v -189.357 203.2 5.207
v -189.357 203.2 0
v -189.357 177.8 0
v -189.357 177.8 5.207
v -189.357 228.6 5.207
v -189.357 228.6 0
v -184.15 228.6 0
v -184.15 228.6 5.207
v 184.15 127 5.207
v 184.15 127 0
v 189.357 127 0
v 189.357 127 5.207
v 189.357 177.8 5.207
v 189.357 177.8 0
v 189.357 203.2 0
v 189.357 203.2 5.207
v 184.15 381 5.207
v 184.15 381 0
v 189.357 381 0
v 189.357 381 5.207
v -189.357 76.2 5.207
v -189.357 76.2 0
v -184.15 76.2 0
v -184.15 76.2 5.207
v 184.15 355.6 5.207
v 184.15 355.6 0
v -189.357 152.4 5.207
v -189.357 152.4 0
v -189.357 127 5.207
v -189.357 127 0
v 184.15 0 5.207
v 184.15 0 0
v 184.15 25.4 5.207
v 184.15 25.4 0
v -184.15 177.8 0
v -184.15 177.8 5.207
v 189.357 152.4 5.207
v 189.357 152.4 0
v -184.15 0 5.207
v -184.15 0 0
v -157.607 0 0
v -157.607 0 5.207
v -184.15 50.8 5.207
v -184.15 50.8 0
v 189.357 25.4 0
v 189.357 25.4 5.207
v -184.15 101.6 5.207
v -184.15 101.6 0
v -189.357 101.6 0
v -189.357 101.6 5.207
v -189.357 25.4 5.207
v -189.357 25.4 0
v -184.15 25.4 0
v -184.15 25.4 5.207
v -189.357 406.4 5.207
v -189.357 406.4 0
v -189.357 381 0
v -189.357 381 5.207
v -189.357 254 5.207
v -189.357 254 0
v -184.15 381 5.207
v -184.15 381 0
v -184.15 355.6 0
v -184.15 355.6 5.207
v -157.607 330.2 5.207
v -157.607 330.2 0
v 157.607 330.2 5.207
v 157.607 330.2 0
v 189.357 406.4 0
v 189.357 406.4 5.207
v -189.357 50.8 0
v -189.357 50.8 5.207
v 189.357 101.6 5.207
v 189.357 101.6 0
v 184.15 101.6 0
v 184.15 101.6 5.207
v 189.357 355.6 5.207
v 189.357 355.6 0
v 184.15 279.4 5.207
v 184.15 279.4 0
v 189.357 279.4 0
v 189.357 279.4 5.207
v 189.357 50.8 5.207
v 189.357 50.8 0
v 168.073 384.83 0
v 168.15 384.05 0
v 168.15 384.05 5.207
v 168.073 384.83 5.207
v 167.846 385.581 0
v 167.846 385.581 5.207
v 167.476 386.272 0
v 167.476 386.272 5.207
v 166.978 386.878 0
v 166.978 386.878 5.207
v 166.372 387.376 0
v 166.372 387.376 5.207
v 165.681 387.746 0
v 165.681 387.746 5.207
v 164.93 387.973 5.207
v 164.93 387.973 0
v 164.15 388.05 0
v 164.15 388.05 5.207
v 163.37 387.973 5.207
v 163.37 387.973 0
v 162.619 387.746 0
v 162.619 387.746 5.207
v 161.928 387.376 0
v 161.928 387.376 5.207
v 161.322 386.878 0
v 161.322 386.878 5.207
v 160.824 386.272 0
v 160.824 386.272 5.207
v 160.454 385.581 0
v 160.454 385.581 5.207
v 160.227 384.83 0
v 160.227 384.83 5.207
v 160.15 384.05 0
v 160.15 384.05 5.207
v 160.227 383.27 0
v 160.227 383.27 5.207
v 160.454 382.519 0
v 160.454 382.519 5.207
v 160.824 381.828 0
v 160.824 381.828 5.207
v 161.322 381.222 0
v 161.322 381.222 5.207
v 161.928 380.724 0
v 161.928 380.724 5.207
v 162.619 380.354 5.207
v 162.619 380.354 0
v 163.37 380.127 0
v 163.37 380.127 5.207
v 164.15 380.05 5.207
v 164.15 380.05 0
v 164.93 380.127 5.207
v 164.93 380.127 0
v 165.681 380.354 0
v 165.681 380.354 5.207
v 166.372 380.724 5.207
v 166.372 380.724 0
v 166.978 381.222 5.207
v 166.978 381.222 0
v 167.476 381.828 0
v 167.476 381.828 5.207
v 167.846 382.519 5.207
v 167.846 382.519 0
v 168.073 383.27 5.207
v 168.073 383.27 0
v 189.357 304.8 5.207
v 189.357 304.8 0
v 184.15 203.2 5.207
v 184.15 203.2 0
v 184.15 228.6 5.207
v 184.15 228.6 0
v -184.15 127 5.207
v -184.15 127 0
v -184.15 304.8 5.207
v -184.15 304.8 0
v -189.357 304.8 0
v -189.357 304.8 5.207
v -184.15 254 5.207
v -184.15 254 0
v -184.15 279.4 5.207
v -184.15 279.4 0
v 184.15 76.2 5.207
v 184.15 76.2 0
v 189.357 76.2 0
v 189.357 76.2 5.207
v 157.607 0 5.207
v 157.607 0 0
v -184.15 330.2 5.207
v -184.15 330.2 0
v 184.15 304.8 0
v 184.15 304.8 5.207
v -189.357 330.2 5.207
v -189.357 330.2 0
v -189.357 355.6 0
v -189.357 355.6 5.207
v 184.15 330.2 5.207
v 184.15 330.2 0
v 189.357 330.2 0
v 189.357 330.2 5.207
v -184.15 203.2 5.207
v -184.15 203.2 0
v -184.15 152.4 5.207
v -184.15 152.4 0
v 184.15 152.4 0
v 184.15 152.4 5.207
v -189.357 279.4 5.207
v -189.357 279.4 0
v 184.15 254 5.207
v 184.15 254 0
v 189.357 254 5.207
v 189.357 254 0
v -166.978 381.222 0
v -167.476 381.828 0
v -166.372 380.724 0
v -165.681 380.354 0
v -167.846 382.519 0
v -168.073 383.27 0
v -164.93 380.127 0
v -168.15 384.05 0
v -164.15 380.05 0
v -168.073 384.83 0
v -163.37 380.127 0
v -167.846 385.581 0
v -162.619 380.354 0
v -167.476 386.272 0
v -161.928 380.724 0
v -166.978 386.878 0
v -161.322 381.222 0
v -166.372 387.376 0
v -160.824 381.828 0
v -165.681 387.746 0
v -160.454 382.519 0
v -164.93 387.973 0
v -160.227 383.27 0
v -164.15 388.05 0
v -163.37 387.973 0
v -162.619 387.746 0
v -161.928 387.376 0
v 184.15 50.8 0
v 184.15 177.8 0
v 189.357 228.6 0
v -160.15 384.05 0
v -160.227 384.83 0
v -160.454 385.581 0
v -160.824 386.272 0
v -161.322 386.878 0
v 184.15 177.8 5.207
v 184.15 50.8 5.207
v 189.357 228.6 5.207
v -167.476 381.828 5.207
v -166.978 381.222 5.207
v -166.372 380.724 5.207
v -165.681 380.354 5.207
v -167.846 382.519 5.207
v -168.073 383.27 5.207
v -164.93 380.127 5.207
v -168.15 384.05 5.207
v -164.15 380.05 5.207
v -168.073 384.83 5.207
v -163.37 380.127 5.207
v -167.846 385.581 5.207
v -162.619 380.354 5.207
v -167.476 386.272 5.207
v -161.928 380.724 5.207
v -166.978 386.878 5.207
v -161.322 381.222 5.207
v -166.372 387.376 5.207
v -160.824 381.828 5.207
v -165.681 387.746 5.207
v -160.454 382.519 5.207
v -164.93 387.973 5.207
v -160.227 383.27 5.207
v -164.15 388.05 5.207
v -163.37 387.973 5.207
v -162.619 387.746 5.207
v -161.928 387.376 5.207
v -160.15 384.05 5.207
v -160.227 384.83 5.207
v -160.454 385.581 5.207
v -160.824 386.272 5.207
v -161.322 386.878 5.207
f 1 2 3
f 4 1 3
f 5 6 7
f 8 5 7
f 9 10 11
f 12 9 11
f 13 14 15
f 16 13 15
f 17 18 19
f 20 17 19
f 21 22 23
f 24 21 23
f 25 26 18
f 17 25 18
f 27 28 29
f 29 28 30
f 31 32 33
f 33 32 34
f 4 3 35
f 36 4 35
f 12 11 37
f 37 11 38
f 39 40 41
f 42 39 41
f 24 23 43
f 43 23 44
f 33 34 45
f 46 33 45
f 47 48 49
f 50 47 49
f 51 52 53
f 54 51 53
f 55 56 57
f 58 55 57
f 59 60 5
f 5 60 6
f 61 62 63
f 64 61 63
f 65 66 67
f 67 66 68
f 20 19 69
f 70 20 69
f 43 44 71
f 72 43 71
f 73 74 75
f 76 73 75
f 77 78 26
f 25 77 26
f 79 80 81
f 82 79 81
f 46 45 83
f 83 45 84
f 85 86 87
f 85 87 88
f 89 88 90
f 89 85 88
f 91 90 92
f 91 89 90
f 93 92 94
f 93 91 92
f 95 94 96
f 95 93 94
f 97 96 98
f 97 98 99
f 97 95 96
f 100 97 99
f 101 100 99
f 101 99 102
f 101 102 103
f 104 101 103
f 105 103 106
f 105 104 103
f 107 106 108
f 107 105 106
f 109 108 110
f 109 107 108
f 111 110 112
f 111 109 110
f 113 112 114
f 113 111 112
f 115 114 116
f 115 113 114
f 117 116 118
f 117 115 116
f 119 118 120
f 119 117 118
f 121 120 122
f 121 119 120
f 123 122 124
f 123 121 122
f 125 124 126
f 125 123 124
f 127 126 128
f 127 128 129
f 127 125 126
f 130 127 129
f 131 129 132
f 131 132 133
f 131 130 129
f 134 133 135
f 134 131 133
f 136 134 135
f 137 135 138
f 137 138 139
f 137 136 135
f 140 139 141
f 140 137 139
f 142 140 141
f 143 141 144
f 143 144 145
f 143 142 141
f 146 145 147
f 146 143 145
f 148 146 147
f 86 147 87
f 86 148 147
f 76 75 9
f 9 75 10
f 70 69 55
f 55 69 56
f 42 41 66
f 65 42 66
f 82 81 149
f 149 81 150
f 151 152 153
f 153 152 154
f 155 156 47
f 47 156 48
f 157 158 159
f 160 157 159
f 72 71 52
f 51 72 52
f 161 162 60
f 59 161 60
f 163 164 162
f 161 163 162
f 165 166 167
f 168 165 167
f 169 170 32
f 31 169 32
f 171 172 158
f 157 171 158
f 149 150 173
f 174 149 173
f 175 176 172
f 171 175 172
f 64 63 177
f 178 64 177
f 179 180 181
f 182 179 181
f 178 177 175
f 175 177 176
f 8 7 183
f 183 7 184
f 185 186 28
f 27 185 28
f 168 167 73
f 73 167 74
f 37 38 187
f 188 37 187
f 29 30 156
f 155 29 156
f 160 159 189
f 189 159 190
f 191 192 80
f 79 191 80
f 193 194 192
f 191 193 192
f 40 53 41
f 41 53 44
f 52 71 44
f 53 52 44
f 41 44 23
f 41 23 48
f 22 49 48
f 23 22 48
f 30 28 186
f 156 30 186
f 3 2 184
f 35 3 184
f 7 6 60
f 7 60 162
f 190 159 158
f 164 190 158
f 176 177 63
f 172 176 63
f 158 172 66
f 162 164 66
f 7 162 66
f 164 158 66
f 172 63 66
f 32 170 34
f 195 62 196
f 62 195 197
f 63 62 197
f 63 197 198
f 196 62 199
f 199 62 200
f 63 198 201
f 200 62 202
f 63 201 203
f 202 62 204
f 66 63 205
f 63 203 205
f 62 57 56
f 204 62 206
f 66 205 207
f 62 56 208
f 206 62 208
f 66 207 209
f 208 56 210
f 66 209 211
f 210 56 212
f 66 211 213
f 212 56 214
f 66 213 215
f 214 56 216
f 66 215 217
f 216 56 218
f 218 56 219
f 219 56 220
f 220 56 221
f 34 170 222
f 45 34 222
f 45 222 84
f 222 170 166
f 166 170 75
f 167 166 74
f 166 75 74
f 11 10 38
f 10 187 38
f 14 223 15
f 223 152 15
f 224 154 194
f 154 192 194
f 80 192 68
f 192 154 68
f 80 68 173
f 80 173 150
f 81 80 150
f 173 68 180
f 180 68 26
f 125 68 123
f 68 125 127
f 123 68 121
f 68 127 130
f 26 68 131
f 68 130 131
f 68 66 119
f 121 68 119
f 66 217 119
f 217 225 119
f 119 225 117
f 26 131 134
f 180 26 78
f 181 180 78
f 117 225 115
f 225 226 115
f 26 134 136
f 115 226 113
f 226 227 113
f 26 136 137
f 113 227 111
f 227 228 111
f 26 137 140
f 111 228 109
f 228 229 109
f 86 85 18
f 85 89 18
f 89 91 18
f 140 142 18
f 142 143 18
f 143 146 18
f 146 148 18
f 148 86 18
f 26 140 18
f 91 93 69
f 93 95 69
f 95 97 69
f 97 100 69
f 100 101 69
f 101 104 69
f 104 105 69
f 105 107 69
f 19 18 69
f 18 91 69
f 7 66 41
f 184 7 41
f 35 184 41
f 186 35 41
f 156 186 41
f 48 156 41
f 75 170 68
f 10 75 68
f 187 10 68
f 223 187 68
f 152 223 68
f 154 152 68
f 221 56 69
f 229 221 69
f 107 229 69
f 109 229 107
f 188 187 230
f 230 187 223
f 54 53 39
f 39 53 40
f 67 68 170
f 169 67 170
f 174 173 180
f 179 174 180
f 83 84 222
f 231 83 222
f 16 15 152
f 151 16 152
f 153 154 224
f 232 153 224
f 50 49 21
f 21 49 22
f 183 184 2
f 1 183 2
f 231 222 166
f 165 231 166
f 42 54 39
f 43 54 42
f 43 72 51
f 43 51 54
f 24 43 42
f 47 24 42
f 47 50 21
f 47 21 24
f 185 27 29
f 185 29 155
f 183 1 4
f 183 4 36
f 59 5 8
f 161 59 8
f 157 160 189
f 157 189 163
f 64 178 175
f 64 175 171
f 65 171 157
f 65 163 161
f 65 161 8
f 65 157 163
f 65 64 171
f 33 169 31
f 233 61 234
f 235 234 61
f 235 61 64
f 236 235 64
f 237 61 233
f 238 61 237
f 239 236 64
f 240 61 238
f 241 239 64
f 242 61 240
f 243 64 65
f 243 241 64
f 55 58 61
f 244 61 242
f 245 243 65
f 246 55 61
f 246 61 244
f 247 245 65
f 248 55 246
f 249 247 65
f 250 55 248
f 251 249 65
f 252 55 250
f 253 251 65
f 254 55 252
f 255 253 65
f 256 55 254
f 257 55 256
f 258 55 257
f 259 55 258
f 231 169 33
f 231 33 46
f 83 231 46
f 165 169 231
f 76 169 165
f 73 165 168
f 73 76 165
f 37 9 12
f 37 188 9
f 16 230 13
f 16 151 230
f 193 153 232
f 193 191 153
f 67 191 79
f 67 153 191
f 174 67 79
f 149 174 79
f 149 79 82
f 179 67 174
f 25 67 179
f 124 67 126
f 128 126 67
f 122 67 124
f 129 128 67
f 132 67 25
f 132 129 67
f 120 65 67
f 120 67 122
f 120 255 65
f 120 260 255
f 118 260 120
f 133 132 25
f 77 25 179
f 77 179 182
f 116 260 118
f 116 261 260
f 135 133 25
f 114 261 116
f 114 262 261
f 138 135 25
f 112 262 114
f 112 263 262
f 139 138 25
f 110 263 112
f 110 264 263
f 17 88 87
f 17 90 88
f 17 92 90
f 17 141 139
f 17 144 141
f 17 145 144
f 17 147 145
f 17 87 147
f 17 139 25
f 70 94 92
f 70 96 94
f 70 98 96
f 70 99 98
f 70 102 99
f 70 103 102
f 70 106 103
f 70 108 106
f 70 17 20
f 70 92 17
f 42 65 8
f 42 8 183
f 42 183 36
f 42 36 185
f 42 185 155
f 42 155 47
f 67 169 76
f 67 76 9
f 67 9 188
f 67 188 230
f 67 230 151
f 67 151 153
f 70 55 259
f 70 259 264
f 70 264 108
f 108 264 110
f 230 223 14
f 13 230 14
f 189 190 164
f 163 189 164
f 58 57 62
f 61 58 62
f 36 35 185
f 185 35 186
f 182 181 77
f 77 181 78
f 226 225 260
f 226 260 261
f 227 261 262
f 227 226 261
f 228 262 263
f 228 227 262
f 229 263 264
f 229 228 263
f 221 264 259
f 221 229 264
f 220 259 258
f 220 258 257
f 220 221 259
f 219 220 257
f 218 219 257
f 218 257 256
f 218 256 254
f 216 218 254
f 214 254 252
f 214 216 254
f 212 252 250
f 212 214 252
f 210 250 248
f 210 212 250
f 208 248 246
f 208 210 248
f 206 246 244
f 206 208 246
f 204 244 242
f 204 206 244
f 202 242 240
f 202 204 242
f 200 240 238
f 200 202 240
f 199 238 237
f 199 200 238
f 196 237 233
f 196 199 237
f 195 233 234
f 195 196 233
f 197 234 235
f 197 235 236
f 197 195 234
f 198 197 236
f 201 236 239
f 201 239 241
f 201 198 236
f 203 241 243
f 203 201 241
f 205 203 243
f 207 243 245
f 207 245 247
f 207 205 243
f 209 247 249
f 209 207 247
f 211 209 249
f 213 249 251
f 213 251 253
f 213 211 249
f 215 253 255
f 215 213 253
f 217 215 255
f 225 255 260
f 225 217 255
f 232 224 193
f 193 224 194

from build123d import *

# Parameters (mm, degrees)
SKETCH1_R           = 4
BOSS_EXTRUDE1_DEPTH = 5.207


with BuildPart() as part:
    # Sketch1 → Boss-Extrude1 (new body)
    with BuildSketch(Plane.XY):
        Polygon((-184.15, 25.4), (-184.15, 0), (-157.607, 0), (-157.607, 330.2), (157.607, 330.2), (157.607, 0), (184.15, 0), (184.15, 25.4), (189.357, 25.4), (189.357, 50.8), (184.15, 50.8), (184.15, 76.2), (189.357, 76.2), (189.357, 101.6), (184.15, 101.6), (184.15, 127), (189.357, 127), (189.357, 152.4), (184.15, 152.4), (184.15, 177.8), (189.357, 177.8), (189.357, 203.2), (184.15, 203.2), (184.15, 228.6), (189.357, 228.6), (189.357, 254), (184.15, 254), (184.15, 279.4), (189.357, 279.4), (189.357, 304.8), (184.15, 304.8), (184.15, 330.2), (189.357, 330.2), (189.357, 355.6), (184.15, 355.6), (184.15, 381), (189.357, 381), (189.357, 406.4), (-189.357, 406.4), (-189.357, 381), (-184.15, 381), (-184.15, 355.6), (-189.357, 355.6), (-189.357, 330.2), (-184.15, 330.2), (-184.15, 304.8), (-189.357, 304.8), (-189.357, 279.4), (-184.15, 279.4), (-184.15, 254), (-189.357, 254), (-189.357, 228.6), (-184.15, 228.6), (-184.15, 203.2), (-189.357, 203.2), (-189.357, 177.8), (-184.15, 177.8), (-184.15, 152.4), (-189.357, 152.4), (-189.357, 127), (-184.15, 127), (-184.15, 101.6), (-189.357, 101.6), (-189.357, 76.2), (-184.15, 76.2), (-184.15, 50.8), (-189.357, 50.8), (-189.357, 25.4), align=None)
        with Locations((-164.150000122, 384.05)):
            Circle(SKETCH1_R, mode=Mode.SUBTRACT)
        with Locations((164.1499892, 384.05)):
            Circle(SKETCH1_R, mode=Mode.SUBTRACT)
    extrude(amount=BOSS_EXTRUDE1_DEPTH)


solid = part.part
